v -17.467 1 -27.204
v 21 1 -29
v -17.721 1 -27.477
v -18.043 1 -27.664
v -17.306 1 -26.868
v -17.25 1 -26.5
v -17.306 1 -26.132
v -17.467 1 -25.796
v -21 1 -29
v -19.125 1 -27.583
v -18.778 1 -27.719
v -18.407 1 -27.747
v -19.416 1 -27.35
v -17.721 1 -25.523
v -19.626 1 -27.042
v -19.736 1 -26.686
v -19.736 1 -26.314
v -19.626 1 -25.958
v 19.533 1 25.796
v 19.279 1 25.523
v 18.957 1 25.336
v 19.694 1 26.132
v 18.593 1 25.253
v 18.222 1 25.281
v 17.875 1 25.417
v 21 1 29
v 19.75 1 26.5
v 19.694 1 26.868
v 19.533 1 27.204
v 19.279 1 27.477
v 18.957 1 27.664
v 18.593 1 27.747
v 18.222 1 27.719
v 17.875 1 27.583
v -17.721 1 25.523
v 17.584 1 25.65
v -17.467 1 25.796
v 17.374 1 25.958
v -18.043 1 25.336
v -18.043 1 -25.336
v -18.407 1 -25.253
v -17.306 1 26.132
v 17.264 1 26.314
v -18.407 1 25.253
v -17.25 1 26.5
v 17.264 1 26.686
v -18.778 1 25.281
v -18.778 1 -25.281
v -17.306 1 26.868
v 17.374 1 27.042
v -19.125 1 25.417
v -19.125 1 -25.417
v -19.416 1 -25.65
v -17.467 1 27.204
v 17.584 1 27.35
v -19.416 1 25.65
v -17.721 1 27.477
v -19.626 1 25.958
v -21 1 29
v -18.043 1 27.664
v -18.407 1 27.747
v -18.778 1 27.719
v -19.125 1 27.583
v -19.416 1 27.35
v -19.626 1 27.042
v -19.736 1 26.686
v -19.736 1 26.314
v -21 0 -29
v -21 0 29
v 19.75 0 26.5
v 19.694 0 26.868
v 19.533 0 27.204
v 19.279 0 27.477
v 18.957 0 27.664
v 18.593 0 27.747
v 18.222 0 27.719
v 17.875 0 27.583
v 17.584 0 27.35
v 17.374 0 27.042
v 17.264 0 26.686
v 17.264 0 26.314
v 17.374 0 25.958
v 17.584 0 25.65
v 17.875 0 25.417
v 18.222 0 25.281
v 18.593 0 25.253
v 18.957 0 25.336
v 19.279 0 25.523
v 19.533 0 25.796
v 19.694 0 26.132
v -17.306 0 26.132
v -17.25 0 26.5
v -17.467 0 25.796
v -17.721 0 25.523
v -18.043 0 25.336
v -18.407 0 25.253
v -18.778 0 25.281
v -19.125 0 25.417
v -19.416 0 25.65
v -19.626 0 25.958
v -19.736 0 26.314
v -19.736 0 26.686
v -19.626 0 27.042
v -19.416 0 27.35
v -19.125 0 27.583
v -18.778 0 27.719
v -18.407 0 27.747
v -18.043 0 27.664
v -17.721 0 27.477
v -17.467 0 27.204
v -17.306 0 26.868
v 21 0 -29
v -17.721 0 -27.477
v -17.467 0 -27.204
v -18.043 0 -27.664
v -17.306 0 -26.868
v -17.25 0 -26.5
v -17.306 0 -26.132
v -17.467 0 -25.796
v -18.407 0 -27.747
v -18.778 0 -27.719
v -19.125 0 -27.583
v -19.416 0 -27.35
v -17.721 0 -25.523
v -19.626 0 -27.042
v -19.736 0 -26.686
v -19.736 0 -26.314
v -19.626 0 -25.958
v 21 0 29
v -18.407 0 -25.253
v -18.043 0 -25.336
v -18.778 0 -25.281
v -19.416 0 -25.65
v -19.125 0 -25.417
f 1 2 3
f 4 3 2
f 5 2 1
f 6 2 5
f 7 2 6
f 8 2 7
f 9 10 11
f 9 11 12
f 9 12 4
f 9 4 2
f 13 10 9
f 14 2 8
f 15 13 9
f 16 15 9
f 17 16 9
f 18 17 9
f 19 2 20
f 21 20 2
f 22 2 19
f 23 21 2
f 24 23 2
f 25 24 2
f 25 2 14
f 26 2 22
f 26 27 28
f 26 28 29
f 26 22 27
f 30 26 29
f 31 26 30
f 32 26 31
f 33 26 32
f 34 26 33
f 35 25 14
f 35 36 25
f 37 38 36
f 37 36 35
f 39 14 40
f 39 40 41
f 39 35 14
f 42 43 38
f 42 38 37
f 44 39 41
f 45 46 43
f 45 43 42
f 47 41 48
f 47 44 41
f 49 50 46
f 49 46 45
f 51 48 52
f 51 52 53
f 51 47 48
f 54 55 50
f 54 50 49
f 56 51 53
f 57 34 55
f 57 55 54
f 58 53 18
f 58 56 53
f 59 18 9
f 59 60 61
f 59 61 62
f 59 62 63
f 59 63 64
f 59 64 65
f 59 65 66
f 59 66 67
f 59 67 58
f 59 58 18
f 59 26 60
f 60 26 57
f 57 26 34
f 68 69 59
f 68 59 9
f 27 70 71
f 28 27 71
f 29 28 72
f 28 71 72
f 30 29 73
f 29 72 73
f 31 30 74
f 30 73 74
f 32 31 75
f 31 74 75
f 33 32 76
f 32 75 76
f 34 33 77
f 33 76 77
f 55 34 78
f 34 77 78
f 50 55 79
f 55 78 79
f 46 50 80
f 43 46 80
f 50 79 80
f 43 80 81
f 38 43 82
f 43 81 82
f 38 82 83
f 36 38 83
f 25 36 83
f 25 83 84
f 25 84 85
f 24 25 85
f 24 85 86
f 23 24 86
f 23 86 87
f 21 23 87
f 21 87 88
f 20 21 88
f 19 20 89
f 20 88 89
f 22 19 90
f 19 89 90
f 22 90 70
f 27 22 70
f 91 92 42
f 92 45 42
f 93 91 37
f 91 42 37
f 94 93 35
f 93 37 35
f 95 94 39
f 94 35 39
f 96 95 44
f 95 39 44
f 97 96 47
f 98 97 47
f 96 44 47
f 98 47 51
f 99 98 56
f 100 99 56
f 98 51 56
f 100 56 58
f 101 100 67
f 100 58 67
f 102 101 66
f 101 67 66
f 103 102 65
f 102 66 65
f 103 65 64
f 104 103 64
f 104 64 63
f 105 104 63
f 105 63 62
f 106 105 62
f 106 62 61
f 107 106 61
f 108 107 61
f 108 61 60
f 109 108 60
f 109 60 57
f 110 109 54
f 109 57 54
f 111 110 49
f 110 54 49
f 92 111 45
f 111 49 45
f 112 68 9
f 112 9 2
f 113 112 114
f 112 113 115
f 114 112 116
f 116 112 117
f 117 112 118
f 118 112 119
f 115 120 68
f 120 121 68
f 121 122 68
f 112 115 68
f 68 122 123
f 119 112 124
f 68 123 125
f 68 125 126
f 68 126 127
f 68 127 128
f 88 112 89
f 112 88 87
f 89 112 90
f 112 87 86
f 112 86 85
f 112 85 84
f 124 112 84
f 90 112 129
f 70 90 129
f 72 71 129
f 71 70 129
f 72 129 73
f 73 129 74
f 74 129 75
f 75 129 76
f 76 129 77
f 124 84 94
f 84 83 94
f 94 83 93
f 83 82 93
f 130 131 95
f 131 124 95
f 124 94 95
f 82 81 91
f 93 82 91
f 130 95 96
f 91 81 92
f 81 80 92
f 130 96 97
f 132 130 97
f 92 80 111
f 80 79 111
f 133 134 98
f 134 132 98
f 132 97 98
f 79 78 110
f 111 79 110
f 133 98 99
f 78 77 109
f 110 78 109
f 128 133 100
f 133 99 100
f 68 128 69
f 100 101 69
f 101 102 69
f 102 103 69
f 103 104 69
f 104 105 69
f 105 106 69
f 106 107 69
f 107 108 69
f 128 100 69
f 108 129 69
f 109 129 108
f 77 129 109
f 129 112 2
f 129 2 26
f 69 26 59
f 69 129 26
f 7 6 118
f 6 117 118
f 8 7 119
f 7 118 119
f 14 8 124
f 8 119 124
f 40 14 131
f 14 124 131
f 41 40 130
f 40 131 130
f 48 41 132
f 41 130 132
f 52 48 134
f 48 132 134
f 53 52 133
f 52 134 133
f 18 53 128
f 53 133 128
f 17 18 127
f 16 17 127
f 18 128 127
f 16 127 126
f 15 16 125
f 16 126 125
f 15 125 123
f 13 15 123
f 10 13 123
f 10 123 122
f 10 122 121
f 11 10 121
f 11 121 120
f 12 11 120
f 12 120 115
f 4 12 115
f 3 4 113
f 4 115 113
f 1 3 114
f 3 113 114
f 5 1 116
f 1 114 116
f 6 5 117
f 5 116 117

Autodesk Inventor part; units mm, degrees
ref_plane "YZ Plane" through (0, 0, 0) normal (1, 0, 0) x (0, 1, 0)
ref_plane "XZ Plane" through (0, 0, 0) normal (0, 1, 0) x (-1, 0, 0)
ref_plane "XY Plane" through (0, 0, 0) normal (0, 0, 1) x (1, 0, 0)
sketch "Sketch1" plane through (0, 0, 0) normal (0, 1, 0) x (-1, 0, 0)
  line L0 (-21, 29) -> (21, 29)
  line L1 (21, 29) -> (21, -29)
  line L2 (21, -29) -> (-21, -29)
  line L3 (-21, -29) -> (-21, 29)
  line L4 (-21, 29) -> (21, -29) construction
  line L5 (21, 29) -> (-21, -29) construction
  point P0 (0, 0)
  dimension "d0" = 42
  dimension "d1" = 58
extrude "Extrusion1" add sketch "Sketch1" along normal blind 1
sketch "Sketch2" plane through (0, 1, 0) normal (0, 1, 0) x (1, 0, 0)
  line L0 (-20.998, 28.8101) -> (20.8952, 28.8101) construction
  line L1 (20.8952, 28.8101) -> (20.8952, -28.9985) construction
  line L2 (20.8952, -28.9985) -> (-20.998, -28.9985) construction
  line L3 (-20.998, -28.9985) -> (-20.998, 28.8101) construction
  point P0 (0, 0)
sketch "Sketch3" plane through (0, 0, 0) normal (0, -1, 0) x (1, 0, 0)
  line L0 (-20.9976, 28.7529) -> (21.0508, 28.7529) construction
  line L1 (21.0508, 28.7529) -> (21.0508, -28.9972) construction
  line L2 (21.0508, -28.9972) -> (-20.9976, -28.9972) construction
  line L3 (-20.9976, -28.9972) -> (-20.9976, 28.7529) construction
  point P0 (0, 0)
sketch "Sketch4" plane through (0, 0, 0) normal (0, -1, 0) x (1, 0, 0)
  line L0 (-21, 29) -> (21, 29) projected
  line L1 (21, 29) -> (18.5, 29)
  line L2 (18.5, 29) -> (18.5, 26.5)
  line L3 (18.5, 26.5) -> (21, 26.5)
  line L4 (21, 26.5) -> (21, 29)
  circle A0 centre (18.5, 26.5) radius 1.25
  point P0 (0, 0)
  dimension "d42" = 2.5
  dimension "d43" = 2.5
  dimension "d44" = 2.5
extrude "Extrusion2" cut sketch "Sketch4" against normal through all contours A0 L3 L2 | L2 L3 A0
sketch "Sketch5" plane through (0, 0, 0) normal (0, -1, 0) x (1, 0, 0)
  line L0 (-21, -29) -> (21, -29) projected
  line L1 (-21, -29) -> (-18.5, -29)
  line L2 (-18.5, -29) -> (-18.5, -26.5)
  line L3 (-18.5, -26.5) -> (-21, -26.5)
  line L4 (-21, -26.5) -> (-21, -29)
  circle A0 centre (-18.5, -26.5) radius 1.25
  point P0 (0, 0)
  dimension "d49" = 2.5
  dimension "d50" = 2.5
  dimension "d51" = 2.5
extrude "Extrusion3" cut sketch "Sketch5" against normal through all contours A0 L3 L2 | L2 L3 A0
sketch "Sketch6" plane through (0, 1, 0) normal (0, 1, 0) x (1, 0, 0)
  line L0 (-21, -29) -> (21, -29) projected
  line L1 (-21, -29) -> (-18.5, -29)
  line L2 (-18.5, -29) -> (-18.5, -26.5)
  line L3 (-18.5, -26.5) -> (-21, -26.5)
  line L4 (-21, -26.5) -> (-21, -29)
  circle A0 centre (-18.5, -26.5) radius 1.25
  point P0 (0, 0)
  dimension "d60" = 2.5
  dimension "d61" = 2.5
  dimension "d62" = 2.5
extrude "Extrusion4" cut sketch "Sketch6" against normal up to next contours A0 L3 L2 | L2 L3 A0
properties part number "regulator"
